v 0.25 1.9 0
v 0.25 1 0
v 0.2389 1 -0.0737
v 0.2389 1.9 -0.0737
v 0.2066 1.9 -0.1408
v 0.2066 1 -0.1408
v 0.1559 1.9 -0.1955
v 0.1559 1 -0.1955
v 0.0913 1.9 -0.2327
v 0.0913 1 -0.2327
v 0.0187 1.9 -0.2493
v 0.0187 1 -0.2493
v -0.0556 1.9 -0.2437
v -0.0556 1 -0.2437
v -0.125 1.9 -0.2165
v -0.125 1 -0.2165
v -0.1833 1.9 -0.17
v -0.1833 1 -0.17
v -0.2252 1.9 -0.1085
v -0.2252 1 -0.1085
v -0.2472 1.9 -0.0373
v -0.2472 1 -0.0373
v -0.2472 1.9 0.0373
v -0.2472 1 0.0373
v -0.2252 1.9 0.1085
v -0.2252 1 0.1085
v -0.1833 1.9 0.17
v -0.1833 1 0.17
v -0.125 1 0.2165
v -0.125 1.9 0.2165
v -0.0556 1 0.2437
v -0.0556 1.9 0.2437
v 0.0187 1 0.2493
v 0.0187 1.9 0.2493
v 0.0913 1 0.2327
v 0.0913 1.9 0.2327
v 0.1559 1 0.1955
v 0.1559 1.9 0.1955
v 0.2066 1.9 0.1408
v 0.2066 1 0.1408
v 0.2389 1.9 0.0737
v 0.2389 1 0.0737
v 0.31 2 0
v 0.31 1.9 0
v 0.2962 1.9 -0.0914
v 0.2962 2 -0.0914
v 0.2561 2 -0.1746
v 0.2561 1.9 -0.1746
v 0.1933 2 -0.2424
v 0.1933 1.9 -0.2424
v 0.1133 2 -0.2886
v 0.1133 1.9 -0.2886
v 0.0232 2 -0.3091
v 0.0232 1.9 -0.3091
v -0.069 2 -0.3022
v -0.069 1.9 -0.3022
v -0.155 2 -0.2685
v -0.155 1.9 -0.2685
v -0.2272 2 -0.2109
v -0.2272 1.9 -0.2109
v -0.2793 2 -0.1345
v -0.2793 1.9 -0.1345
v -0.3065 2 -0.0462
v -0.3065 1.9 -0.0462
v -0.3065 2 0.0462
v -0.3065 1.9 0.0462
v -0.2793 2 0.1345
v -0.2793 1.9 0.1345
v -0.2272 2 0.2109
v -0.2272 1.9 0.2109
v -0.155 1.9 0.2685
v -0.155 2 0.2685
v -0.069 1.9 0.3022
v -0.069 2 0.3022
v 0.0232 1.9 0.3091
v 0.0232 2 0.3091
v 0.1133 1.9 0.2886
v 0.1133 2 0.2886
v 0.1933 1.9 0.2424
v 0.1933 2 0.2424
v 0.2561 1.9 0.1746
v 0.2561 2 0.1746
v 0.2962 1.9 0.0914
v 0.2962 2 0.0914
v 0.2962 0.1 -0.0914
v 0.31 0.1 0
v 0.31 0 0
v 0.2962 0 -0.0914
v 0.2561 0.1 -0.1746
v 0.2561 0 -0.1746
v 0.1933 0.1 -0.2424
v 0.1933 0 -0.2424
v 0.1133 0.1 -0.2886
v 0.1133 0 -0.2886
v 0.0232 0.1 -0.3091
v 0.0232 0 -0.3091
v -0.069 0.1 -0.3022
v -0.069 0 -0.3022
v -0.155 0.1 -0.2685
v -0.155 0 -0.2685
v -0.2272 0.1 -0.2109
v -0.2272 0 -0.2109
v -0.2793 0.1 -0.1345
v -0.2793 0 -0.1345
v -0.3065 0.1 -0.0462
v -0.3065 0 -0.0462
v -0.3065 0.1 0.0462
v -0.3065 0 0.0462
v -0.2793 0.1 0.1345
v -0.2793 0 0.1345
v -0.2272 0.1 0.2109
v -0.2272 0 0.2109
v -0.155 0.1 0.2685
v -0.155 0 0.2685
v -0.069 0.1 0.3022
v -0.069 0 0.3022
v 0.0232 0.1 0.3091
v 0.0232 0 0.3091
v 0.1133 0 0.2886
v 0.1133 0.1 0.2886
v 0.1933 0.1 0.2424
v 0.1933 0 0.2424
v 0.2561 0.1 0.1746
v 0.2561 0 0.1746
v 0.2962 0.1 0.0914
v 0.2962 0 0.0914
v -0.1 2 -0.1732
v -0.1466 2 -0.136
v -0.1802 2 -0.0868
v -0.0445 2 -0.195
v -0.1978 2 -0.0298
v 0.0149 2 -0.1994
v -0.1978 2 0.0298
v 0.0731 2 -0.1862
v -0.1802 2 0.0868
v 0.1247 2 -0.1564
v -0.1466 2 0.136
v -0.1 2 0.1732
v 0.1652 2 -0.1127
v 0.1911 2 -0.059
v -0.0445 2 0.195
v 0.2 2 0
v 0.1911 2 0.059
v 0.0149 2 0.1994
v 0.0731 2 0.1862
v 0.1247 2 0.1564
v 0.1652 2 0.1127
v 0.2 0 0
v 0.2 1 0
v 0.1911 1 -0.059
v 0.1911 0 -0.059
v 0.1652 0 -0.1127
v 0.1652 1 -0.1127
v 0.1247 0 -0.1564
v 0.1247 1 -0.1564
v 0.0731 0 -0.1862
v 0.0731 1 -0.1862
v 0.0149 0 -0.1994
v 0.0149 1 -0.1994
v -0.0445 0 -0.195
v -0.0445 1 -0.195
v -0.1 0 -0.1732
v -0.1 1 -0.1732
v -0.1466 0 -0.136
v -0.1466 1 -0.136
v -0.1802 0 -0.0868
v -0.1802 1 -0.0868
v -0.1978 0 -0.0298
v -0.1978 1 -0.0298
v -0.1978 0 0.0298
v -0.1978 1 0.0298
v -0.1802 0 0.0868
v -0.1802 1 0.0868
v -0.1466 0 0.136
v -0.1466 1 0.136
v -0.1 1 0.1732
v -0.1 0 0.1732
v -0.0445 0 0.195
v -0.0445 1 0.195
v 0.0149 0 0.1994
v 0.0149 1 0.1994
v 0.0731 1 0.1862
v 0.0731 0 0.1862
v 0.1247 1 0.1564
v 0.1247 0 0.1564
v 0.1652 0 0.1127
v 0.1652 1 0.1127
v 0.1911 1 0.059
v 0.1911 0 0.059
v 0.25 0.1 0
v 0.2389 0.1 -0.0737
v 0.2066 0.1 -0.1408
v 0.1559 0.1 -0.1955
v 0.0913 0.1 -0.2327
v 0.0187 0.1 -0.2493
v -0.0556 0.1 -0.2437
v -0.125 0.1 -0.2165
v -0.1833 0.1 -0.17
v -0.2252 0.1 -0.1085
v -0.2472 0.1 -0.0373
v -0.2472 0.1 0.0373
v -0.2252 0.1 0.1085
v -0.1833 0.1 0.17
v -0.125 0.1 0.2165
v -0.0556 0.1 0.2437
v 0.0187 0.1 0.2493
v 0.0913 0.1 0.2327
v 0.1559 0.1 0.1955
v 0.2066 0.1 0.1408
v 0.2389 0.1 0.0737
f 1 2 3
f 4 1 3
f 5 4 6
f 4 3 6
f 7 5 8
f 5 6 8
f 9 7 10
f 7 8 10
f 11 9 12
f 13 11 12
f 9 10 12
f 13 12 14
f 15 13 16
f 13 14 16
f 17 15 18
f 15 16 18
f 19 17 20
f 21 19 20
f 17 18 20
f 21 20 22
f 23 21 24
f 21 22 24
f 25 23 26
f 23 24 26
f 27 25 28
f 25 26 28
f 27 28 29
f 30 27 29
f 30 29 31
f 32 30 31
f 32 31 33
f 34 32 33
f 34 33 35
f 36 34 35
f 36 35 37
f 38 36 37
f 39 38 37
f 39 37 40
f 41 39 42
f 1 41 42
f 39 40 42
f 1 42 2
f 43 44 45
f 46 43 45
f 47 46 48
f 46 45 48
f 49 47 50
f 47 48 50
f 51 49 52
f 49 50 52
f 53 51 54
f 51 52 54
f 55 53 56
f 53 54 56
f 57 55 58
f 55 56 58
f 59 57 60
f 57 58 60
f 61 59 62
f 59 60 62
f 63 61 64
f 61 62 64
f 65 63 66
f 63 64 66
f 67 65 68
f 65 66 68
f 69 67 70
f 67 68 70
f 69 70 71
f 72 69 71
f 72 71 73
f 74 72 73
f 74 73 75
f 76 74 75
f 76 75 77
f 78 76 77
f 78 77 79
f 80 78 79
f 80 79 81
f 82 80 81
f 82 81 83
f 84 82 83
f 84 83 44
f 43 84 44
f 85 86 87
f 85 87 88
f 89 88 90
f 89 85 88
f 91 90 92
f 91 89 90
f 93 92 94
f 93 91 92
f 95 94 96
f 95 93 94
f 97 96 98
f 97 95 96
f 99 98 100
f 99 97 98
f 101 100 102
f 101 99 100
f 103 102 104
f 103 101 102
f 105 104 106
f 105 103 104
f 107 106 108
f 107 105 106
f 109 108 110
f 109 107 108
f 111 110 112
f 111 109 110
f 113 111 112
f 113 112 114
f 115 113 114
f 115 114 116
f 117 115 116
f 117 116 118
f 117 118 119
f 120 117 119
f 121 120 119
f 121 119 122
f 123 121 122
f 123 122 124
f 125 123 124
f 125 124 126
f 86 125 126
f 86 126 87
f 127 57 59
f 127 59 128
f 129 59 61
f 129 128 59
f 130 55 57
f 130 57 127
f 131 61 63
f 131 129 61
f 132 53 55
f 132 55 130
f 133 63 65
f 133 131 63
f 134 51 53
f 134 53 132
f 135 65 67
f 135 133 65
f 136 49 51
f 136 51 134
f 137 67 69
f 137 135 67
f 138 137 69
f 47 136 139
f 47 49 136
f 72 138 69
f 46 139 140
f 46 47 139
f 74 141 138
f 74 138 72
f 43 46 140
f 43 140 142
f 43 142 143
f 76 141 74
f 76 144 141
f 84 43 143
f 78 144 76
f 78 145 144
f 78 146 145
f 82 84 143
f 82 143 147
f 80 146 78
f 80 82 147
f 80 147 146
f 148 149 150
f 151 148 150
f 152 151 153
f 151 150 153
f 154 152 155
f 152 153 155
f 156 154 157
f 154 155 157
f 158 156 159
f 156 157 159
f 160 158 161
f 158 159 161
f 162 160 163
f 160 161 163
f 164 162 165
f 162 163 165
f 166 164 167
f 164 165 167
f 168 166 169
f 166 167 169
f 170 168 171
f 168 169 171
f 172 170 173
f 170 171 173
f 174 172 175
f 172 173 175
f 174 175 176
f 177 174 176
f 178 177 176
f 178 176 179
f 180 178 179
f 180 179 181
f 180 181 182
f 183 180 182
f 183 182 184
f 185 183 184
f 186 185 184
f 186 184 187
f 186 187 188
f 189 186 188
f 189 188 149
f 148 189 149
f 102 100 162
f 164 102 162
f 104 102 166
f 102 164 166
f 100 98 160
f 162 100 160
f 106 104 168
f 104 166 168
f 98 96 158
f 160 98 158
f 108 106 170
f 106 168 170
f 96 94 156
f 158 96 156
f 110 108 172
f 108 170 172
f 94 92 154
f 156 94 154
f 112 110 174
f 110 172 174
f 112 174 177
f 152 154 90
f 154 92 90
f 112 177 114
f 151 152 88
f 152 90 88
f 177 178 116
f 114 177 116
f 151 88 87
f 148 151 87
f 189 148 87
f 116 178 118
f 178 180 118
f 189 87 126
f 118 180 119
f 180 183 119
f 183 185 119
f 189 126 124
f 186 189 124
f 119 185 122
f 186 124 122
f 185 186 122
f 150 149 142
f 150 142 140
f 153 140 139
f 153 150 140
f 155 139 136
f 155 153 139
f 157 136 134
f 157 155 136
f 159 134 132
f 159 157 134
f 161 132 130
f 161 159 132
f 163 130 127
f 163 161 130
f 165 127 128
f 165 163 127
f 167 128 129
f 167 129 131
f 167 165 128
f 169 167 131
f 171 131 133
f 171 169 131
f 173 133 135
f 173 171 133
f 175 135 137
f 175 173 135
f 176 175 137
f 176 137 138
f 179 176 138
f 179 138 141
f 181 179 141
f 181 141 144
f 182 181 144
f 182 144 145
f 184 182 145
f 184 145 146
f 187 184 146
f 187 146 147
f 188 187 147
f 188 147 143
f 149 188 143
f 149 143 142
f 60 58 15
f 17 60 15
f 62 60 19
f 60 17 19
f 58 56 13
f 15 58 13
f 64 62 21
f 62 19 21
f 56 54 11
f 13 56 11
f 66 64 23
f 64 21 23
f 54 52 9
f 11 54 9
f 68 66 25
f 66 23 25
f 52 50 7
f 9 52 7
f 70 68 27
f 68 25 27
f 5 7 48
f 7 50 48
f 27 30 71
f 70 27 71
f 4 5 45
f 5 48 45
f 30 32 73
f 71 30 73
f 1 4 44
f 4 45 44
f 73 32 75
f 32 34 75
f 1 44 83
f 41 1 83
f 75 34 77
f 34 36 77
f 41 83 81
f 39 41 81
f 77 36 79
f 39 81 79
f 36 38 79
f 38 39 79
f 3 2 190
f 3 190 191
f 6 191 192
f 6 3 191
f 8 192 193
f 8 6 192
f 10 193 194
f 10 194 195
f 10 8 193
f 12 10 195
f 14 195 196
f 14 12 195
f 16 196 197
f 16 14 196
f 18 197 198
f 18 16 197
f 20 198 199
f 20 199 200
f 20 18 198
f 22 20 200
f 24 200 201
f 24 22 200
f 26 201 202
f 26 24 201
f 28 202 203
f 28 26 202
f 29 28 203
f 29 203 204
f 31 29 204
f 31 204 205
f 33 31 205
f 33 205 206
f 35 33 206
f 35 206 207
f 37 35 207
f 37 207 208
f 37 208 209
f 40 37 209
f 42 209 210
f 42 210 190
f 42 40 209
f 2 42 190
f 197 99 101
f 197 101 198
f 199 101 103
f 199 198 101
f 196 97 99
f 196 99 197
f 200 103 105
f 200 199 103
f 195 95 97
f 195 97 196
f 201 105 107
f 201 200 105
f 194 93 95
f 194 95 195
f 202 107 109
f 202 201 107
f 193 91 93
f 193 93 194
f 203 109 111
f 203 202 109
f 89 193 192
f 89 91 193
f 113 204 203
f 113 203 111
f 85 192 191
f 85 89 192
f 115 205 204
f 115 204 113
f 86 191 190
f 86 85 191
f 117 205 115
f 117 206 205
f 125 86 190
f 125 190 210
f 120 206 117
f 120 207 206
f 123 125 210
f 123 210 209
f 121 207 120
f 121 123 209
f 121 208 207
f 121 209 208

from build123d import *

# Parameters (mm, degrees)
SKETCH3_R   = 0.25
SKETCH3_R_2 = 0.2
SKETCH6_R   = 0.31
SKETCH6_R_2 = 0.21


with BuildPart() as part:
    # Sweep-Thin1: sweep along a path in Sketch1
    with BuildLine(Plane.XY) as sweep_thin1_path:
        Line((0, 0), (0, 1))
    # Sketch3 → Sweep-Thin1 (sweep)
    with BuildSketch(Plane(origin=(0, 0, 0), x_dir=(1, 0, 0), z_dir=(0, 1, 0))):
        Circle(SKETCH3_R)
        Circle(SKETCH3_R_2, mode=Mode.SUBTRACT)
    sweep(path=sweep_thin1_path.line)

    # Sweep-Thin2: sweep along a path in Sketch5
    with BuildLine(Plane.XY) as sweep_thin2_path:
        Line((0, 0), (0, 0.1))
    # Sketch6 → Sweep-Thin2 (sweep)
    with BuildSketch(Plane(origin=(0, 0, 0), x_dir=(1, 0, 0), z_dir=(0, 1, 0))):
        Circle(SKETCH6_R)
        Circle(SKETCH6_R_2, mode=Mode.SUBTRACT)
    sweep(path=sweep_thin2_path.line)

    # Mirror2: part across plane


with BuildPart() as part_1:
    add(part.part)
    add(part.part.mirror(Plane.ZX.offset(1)))


solid = part_1.part
